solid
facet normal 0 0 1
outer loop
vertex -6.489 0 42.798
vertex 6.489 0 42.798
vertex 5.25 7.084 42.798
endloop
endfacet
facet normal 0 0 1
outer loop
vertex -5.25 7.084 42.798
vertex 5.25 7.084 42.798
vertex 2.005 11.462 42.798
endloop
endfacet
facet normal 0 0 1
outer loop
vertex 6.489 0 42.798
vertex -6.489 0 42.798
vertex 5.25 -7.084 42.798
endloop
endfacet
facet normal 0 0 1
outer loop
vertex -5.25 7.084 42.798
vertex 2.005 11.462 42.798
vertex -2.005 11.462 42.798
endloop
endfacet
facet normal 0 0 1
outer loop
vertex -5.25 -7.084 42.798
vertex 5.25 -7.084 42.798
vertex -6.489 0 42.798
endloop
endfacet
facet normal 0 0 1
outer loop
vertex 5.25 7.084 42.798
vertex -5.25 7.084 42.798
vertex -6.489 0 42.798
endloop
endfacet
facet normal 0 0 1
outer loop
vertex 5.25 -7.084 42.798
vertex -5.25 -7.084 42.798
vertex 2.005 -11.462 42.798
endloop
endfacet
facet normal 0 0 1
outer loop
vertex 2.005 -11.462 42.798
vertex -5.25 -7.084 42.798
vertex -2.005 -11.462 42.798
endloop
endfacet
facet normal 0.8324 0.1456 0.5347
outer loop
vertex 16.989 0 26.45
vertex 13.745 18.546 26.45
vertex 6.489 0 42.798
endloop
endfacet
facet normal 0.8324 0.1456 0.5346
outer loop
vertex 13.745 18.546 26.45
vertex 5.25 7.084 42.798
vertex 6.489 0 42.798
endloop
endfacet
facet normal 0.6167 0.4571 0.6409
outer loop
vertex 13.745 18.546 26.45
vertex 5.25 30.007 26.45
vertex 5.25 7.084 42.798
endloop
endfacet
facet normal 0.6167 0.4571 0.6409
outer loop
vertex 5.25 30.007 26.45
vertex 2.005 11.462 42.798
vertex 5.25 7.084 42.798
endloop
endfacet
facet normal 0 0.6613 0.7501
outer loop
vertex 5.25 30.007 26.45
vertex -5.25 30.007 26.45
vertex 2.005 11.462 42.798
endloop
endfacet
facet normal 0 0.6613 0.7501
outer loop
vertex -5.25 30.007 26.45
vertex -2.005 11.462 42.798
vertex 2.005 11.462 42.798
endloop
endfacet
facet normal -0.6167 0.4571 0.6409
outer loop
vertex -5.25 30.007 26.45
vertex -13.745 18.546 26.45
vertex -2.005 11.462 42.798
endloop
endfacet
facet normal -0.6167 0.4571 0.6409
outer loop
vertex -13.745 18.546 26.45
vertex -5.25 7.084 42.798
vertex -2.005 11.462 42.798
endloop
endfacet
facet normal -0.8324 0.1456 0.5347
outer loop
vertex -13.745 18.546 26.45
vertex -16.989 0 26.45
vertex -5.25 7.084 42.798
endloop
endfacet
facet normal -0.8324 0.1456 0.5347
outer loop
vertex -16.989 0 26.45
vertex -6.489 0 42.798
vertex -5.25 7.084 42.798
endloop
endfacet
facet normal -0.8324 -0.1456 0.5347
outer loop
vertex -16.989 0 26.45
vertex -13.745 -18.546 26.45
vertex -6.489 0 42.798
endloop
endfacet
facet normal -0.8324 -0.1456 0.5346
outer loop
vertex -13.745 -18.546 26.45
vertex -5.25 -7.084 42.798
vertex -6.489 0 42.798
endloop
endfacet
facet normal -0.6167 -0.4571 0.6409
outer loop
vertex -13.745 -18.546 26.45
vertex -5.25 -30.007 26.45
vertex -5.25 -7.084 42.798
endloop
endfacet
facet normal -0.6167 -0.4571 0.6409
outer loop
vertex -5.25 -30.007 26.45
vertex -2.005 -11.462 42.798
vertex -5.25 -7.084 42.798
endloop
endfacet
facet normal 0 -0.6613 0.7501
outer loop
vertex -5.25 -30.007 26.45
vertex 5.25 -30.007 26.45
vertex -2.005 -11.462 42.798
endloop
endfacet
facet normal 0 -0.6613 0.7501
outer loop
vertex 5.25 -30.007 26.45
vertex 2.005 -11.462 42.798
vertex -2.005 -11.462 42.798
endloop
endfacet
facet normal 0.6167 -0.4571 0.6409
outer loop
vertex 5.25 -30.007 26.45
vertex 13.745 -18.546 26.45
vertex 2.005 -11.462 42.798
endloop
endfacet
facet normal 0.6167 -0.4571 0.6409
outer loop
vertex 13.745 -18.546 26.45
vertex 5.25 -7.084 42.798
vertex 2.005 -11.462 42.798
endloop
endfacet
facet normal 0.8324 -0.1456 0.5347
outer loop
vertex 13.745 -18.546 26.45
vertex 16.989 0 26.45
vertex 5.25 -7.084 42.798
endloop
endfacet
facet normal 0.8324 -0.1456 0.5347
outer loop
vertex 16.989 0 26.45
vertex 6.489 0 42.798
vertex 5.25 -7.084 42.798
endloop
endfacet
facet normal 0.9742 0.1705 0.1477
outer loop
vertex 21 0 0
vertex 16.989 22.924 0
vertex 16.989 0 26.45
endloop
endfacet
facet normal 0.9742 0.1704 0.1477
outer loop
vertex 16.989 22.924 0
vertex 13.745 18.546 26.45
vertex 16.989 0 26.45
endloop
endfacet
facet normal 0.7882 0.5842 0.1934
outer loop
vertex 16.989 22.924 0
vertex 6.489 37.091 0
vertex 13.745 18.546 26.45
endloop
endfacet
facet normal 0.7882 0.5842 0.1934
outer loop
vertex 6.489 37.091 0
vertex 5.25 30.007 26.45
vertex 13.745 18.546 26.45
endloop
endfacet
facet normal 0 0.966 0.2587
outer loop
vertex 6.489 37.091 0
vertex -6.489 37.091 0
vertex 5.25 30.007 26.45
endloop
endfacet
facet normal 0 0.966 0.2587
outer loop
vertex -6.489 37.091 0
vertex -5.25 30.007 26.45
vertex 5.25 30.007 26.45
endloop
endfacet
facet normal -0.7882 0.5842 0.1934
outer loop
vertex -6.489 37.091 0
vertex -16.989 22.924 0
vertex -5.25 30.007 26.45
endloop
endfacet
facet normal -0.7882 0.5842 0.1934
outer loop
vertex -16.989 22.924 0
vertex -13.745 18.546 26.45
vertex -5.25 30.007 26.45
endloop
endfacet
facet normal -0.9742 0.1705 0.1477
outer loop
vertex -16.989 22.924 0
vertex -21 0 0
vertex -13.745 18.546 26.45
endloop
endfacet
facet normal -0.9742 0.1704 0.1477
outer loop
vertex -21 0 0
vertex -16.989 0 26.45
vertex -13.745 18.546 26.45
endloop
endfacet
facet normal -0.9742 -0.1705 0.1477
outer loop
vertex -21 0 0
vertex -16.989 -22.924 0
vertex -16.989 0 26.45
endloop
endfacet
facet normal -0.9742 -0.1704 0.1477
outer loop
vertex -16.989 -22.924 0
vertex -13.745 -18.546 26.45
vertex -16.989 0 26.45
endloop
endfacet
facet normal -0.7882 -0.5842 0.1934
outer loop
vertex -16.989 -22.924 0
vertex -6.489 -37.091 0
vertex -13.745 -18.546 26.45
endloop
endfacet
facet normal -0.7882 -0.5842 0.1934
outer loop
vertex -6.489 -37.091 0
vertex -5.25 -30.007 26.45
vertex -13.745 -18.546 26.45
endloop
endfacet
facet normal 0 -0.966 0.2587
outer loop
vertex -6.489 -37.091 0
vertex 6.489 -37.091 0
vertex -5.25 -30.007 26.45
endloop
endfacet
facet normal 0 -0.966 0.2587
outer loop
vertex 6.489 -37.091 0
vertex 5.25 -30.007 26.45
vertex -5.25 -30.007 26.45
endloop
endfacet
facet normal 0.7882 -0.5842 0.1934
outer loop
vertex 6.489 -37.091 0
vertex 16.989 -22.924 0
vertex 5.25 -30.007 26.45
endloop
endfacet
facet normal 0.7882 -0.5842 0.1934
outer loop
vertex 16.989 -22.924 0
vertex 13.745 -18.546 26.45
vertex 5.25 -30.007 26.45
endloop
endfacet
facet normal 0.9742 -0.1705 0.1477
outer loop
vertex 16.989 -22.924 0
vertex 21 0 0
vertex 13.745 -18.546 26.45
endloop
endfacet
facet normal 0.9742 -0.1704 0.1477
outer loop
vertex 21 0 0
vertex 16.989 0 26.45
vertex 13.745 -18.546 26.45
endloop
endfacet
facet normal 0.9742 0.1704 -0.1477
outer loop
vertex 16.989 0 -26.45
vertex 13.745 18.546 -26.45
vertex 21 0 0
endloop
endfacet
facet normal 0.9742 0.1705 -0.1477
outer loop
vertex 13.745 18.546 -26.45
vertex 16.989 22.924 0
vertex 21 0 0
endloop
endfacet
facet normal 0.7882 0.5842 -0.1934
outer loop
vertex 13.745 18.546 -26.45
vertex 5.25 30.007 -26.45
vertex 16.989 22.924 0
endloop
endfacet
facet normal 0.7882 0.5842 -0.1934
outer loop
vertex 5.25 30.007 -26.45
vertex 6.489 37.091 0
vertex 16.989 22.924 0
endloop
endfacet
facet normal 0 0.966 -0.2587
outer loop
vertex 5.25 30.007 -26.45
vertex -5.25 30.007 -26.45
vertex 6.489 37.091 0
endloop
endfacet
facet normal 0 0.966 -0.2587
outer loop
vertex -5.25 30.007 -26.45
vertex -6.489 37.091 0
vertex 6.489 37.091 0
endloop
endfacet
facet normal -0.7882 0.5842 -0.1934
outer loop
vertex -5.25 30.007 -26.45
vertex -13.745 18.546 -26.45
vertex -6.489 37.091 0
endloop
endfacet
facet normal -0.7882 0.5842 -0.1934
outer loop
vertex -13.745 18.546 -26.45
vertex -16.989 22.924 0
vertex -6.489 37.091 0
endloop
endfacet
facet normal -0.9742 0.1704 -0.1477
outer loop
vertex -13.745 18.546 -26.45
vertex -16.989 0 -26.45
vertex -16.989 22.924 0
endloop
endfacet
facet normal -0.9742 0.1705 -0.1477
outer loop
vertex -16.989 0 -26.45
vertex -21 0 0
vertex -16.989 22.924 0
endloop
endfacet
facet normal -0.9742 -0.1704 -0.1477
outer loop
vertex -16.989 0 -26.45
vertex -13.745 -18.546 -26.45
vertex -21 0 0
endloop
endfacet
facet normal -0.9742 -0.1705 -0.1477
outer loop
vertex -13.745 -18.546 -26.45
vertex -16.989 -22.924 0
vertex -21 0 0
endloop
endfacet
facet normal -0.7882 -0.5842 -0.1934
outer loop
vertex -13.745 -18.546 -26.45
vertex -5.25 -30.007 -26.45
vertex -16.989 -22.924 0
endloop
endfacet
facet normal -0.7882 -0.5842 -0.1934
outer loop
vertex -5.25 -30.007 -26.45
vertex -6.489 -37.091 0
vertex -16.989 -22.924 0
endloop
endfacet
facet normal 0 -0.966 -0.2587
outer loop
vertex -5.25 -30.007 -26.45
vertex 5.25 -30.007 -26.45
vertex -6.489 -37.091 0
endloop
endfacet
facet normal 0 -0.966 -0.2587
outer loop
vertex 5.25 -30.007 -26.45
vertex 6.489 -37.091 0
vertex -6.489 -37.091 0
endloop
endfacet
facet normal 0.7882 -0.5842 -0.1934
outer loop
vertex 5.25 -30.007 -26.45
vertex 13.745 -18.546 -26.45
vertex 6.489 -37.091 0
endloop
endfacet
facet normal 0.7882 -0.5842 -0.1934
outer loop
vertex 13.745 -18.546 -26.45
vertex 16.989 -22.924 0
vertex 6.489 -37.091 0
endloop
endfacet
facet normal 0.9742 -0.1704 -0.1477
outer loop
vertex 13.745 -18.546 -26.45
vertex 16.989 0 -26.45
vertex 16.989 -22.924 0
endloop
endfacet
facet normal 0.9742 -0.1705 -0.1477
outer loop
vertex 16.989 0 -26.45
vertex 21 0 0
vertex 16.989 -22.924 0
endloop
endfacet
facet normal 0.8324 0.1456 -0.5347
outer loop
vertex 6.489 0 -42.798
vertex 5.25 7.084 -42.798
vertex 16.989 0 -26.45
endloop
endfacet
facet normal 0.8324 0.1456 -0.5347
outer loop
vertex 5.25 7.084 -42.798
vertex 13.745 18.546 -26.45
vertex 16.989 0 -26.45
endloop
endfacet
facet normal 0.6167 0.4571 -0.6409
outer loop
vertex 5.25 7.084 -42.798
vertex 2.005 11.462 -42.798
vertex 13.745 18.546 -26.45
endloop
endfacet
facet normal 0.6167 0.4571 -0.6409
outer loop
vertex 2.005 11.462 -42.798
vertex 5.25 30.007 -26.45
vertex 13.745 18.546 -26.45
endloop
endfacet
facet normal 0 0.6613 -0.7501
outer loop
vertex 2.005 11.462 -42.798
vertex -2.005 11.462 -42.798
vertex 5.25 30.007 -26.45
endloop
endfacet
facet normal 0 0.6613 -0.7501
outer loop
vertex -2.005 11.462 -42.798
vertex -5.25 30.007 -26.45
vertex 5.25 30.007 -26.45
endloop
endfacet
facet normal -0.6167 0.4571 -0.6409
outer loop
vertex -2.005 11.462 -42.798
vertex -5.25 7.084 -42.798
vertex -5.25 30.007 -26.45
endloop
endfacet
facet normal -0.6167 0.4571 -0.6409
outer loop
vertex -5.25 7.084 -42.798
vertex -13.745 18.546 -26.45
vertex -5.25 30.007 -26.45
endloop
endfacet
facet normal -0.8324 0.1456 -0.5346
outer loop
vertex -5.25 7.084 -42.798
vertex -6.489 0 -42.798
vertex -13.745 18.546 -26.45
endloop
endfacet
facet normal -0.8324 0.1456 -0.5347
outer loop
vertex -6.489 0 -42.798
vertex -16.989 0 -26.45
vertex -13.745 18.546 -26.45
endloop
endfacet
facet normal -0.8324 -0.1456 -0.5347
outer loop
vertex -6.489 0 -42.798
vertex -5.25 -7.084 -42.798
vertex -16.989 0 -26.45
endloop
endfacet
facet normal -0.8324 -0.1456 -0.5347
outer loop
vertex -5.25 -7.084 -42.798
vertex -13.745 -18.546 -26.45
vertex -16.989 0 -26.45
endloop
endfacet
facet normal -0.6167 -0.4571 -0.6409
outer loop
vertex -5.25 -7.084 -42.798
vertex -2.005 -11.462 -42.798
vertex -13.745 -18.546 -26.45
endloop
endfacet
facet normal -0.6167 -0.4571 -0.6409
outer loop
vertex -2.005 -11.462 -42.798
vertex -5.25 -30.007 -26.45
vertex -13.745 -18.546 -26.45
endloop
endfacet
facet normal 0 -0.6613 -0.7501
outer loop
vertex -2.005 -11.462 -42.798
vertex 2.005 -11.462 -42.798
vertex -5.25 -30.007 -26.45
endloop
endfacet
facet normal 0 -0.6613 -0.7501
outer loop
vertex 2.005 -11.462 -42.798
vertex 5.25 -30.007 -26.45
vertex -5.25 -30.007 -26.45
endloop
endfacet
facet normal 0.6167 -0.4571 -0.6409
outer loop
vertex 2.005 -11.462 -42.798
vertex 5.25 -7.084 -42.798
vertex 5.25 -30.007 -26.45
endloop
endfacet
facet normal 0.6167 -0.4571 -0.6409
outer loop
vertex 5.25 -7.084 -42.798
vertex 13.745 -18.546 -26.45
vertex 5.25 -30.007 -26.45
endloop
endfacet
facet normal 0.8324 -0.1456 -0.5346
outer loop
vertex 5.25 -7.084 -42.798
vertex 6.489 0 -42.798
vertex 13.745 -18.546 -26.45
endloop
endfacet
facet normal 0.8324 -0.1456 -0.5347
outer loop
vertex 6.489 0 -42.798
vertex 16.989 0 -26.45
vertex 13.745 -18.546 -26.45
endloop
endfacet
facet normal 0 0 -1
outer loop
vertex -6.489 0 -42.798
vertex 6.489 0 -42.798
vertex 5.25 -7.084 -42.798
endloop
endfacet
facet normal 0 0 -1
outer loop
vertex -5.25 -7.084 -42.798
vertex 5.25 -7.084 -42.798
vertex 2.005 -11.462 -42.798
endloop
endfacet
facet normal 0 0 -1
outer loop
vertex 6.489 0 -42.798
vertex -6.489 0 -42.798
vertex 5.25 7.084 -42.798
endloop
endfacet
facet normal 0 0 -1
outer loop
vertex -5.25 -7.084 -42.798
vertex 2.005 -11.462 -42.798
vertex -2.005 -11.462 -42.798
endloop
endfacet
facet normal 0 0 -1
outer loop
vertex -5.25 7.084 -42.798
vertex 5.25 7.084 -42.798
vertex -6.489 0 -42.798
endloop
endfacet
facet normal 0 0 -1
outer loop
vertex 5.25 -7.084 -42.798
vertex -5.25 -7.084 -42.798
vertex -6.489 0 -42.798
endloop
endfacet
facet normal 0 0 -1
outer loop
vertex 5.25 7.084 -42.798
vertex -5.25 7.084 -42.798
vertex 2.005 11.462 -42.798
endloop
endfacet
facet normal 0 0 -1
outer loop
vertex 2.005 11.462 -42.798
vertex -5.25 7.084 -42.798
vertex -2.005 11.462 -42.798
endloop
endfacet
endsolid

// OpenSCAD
// Generated by SolidPython 1.0.1 on 2020-07-29 00:46:47


scale(v = [7, 13, 15]) {
	sphere(r = 3);
}
/***********************************************
*********      SolidPython code:      **********
************************************************
 
# import packages: SolidPython
from solid import *
from solid.utils import *
from itertools import chain, combinations, permutations


class Resize:

    def __init__(self, scad_file):
        self.scad_file = scad_file
        #self.scad_file = import_scad(scad_file)
        # cone/cylinder param:
        self.r1 = 0
        self.r2 = 0
        self.h = 0
        # rectangular prism param:
        self.w = 0
        self.l = 0
        # ellipse param:
        self.r = 0

    # import OpenScad code (file name corresponds to shape)


    # classify shape + parameters
    def assign(self, param1, param2, param3):
        if self.scad_file == 'cone.scad':
            self.r1 = param1
            self.r2 = param2
            self.h = param3
        elif self.scad_file == 'cylinder.scad':
            self.r1 = param1
            self.r2 = param2
            self.h = param3
        elif self.scad_file == 'rectangularPrism.scad':
            self.h = param1
            self.l = param2
            self.w = param3
        else:
            self.r = param1
            self.h = param2

    # resize parameters
    def iterate(self):
        x = range(3, 20, 2)
        i = 1
        if self.scad_file == 'cone.scad':
            tempList = list(permutations(x, 2))
            for temp in tempList:
                param1 = temp[0]
                param2 = temp[1]
                filepath = 'produced_scad_files/' + 'cone' + str(param1) + '_' + str(param2) + '_' + '.scad'
                scad_render_to_file(cylinder(h=param1, r1=param2, r2=0), filepath)

        elif self.scad_file == 'cylinder.scad':
            tempList = list(permutations(x, 3))
            for temp in tempList:
                param1 = temp[0]
                param2 = temp[1]
                filepath = 'produced_scad_files/' + 'cylinder' + str(param1) + '_' + str(param2) + '_' + '.scad'
                scad_render_to_file(cylinder(h=param1, r1=param2, r2=param2), filepath)

        elif self.scad_file == 'rectangularPrism.scad':
            tempList = list(permutations(x, 3))
            for temp in tempList:
                param1 = temp[0]
                param2 = temp[1]
                param3 = temp[2]
                filepath = 'produced_scad_files/' + 'rectangularPrism' + str(param1) + '_' + str(param2) + '_' + str(
                    param3) + '.scad'
                scad_render_to_file(cube(size=(param1, param2, param3)), filepath)

        elif self.scad_file == 'ellipse.scad':
            tempList = list(permutations(x, 4))
            for temp in tempList:
                param1 = temp[0]
                param2 = temp[1]
                param3 = temp[2]
                param4 = temp[3]
                filepath = 'produced_scad_files/' + 'ellipse' + str(param1) + '_' + str(param2) + '_' + str(param3) + '_' + str(param4) + '.scad'
                scad_render_to_file(scale([param1, param2, param3])(sphere(r=param4)), filepath)

    def render_to_scadfile(self):
        scad_render_to_file(scad, 'example.scad') 
 
************************************************/
